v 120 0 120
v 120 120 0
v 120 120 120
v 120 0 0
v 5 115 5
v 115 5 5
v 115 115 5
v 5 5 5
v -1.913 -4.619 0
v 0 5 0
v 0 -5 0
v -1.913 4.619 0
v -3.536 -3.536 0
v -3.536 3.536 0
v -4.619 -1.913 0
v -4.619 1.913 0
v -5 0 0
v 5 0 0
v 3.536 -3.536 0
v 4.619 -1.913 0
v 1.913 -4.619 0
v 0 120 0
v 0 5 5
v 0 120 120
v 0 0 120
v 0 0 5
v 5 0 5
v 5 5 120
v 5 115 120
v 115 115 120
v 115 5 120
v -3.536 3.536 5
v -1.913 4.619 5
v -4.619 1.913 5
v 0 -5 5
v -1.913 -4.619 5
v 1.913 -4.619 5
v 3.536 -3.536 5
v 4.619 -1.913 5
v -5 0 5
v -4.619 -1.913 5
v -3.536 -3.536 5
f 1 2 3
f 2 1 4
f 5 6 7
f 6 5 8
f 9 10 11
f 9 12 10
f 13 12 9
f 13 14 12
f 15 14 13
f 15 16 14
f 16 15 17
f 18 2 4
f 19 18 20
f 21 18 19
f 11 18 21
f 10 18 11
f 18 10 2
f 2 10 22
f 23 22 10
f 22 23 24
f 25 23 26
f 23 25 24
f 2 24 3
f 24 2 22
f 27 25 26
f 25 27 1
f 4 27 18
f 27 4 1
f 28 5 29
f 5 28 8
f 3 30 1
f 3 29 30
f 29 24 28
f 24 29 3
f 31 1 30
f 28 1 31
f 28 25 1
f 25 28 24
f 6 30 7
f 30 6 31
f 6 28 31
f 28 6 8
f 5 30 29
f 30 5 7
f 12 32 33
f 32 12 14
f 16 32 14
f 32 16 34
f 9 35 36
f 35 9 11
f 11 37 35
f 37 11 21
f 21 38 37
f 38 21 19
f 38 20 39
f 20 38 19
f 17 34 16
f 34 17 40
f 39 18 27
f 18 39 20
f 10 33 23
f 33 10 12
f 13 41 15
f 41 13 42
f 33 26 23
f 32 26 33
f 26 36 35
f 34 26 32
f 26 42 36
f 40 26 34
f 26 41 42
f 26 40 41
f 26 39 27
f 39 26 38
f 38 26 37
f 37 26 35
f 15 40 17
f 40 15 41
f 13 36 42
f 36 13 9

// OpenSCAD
wall_thickness = 5;
wall_width = 120;
cube([wall_width,wall_width,wall_thickness]);
cube([wall_thickness,wall_width,wall_width]);
translate([wall_width-wall_thickness,0,0]){
    cube([wall_thickness,wall_width,wall_width]);
}
cube([wall_width,wall_thickness,wall_width]);
translate([0,wall_width-wall_thickness,0]){
    cube([wall_width,wall_thickness,wall_width]);
}


cylinder(d = 10, h = wall_thickness); 
